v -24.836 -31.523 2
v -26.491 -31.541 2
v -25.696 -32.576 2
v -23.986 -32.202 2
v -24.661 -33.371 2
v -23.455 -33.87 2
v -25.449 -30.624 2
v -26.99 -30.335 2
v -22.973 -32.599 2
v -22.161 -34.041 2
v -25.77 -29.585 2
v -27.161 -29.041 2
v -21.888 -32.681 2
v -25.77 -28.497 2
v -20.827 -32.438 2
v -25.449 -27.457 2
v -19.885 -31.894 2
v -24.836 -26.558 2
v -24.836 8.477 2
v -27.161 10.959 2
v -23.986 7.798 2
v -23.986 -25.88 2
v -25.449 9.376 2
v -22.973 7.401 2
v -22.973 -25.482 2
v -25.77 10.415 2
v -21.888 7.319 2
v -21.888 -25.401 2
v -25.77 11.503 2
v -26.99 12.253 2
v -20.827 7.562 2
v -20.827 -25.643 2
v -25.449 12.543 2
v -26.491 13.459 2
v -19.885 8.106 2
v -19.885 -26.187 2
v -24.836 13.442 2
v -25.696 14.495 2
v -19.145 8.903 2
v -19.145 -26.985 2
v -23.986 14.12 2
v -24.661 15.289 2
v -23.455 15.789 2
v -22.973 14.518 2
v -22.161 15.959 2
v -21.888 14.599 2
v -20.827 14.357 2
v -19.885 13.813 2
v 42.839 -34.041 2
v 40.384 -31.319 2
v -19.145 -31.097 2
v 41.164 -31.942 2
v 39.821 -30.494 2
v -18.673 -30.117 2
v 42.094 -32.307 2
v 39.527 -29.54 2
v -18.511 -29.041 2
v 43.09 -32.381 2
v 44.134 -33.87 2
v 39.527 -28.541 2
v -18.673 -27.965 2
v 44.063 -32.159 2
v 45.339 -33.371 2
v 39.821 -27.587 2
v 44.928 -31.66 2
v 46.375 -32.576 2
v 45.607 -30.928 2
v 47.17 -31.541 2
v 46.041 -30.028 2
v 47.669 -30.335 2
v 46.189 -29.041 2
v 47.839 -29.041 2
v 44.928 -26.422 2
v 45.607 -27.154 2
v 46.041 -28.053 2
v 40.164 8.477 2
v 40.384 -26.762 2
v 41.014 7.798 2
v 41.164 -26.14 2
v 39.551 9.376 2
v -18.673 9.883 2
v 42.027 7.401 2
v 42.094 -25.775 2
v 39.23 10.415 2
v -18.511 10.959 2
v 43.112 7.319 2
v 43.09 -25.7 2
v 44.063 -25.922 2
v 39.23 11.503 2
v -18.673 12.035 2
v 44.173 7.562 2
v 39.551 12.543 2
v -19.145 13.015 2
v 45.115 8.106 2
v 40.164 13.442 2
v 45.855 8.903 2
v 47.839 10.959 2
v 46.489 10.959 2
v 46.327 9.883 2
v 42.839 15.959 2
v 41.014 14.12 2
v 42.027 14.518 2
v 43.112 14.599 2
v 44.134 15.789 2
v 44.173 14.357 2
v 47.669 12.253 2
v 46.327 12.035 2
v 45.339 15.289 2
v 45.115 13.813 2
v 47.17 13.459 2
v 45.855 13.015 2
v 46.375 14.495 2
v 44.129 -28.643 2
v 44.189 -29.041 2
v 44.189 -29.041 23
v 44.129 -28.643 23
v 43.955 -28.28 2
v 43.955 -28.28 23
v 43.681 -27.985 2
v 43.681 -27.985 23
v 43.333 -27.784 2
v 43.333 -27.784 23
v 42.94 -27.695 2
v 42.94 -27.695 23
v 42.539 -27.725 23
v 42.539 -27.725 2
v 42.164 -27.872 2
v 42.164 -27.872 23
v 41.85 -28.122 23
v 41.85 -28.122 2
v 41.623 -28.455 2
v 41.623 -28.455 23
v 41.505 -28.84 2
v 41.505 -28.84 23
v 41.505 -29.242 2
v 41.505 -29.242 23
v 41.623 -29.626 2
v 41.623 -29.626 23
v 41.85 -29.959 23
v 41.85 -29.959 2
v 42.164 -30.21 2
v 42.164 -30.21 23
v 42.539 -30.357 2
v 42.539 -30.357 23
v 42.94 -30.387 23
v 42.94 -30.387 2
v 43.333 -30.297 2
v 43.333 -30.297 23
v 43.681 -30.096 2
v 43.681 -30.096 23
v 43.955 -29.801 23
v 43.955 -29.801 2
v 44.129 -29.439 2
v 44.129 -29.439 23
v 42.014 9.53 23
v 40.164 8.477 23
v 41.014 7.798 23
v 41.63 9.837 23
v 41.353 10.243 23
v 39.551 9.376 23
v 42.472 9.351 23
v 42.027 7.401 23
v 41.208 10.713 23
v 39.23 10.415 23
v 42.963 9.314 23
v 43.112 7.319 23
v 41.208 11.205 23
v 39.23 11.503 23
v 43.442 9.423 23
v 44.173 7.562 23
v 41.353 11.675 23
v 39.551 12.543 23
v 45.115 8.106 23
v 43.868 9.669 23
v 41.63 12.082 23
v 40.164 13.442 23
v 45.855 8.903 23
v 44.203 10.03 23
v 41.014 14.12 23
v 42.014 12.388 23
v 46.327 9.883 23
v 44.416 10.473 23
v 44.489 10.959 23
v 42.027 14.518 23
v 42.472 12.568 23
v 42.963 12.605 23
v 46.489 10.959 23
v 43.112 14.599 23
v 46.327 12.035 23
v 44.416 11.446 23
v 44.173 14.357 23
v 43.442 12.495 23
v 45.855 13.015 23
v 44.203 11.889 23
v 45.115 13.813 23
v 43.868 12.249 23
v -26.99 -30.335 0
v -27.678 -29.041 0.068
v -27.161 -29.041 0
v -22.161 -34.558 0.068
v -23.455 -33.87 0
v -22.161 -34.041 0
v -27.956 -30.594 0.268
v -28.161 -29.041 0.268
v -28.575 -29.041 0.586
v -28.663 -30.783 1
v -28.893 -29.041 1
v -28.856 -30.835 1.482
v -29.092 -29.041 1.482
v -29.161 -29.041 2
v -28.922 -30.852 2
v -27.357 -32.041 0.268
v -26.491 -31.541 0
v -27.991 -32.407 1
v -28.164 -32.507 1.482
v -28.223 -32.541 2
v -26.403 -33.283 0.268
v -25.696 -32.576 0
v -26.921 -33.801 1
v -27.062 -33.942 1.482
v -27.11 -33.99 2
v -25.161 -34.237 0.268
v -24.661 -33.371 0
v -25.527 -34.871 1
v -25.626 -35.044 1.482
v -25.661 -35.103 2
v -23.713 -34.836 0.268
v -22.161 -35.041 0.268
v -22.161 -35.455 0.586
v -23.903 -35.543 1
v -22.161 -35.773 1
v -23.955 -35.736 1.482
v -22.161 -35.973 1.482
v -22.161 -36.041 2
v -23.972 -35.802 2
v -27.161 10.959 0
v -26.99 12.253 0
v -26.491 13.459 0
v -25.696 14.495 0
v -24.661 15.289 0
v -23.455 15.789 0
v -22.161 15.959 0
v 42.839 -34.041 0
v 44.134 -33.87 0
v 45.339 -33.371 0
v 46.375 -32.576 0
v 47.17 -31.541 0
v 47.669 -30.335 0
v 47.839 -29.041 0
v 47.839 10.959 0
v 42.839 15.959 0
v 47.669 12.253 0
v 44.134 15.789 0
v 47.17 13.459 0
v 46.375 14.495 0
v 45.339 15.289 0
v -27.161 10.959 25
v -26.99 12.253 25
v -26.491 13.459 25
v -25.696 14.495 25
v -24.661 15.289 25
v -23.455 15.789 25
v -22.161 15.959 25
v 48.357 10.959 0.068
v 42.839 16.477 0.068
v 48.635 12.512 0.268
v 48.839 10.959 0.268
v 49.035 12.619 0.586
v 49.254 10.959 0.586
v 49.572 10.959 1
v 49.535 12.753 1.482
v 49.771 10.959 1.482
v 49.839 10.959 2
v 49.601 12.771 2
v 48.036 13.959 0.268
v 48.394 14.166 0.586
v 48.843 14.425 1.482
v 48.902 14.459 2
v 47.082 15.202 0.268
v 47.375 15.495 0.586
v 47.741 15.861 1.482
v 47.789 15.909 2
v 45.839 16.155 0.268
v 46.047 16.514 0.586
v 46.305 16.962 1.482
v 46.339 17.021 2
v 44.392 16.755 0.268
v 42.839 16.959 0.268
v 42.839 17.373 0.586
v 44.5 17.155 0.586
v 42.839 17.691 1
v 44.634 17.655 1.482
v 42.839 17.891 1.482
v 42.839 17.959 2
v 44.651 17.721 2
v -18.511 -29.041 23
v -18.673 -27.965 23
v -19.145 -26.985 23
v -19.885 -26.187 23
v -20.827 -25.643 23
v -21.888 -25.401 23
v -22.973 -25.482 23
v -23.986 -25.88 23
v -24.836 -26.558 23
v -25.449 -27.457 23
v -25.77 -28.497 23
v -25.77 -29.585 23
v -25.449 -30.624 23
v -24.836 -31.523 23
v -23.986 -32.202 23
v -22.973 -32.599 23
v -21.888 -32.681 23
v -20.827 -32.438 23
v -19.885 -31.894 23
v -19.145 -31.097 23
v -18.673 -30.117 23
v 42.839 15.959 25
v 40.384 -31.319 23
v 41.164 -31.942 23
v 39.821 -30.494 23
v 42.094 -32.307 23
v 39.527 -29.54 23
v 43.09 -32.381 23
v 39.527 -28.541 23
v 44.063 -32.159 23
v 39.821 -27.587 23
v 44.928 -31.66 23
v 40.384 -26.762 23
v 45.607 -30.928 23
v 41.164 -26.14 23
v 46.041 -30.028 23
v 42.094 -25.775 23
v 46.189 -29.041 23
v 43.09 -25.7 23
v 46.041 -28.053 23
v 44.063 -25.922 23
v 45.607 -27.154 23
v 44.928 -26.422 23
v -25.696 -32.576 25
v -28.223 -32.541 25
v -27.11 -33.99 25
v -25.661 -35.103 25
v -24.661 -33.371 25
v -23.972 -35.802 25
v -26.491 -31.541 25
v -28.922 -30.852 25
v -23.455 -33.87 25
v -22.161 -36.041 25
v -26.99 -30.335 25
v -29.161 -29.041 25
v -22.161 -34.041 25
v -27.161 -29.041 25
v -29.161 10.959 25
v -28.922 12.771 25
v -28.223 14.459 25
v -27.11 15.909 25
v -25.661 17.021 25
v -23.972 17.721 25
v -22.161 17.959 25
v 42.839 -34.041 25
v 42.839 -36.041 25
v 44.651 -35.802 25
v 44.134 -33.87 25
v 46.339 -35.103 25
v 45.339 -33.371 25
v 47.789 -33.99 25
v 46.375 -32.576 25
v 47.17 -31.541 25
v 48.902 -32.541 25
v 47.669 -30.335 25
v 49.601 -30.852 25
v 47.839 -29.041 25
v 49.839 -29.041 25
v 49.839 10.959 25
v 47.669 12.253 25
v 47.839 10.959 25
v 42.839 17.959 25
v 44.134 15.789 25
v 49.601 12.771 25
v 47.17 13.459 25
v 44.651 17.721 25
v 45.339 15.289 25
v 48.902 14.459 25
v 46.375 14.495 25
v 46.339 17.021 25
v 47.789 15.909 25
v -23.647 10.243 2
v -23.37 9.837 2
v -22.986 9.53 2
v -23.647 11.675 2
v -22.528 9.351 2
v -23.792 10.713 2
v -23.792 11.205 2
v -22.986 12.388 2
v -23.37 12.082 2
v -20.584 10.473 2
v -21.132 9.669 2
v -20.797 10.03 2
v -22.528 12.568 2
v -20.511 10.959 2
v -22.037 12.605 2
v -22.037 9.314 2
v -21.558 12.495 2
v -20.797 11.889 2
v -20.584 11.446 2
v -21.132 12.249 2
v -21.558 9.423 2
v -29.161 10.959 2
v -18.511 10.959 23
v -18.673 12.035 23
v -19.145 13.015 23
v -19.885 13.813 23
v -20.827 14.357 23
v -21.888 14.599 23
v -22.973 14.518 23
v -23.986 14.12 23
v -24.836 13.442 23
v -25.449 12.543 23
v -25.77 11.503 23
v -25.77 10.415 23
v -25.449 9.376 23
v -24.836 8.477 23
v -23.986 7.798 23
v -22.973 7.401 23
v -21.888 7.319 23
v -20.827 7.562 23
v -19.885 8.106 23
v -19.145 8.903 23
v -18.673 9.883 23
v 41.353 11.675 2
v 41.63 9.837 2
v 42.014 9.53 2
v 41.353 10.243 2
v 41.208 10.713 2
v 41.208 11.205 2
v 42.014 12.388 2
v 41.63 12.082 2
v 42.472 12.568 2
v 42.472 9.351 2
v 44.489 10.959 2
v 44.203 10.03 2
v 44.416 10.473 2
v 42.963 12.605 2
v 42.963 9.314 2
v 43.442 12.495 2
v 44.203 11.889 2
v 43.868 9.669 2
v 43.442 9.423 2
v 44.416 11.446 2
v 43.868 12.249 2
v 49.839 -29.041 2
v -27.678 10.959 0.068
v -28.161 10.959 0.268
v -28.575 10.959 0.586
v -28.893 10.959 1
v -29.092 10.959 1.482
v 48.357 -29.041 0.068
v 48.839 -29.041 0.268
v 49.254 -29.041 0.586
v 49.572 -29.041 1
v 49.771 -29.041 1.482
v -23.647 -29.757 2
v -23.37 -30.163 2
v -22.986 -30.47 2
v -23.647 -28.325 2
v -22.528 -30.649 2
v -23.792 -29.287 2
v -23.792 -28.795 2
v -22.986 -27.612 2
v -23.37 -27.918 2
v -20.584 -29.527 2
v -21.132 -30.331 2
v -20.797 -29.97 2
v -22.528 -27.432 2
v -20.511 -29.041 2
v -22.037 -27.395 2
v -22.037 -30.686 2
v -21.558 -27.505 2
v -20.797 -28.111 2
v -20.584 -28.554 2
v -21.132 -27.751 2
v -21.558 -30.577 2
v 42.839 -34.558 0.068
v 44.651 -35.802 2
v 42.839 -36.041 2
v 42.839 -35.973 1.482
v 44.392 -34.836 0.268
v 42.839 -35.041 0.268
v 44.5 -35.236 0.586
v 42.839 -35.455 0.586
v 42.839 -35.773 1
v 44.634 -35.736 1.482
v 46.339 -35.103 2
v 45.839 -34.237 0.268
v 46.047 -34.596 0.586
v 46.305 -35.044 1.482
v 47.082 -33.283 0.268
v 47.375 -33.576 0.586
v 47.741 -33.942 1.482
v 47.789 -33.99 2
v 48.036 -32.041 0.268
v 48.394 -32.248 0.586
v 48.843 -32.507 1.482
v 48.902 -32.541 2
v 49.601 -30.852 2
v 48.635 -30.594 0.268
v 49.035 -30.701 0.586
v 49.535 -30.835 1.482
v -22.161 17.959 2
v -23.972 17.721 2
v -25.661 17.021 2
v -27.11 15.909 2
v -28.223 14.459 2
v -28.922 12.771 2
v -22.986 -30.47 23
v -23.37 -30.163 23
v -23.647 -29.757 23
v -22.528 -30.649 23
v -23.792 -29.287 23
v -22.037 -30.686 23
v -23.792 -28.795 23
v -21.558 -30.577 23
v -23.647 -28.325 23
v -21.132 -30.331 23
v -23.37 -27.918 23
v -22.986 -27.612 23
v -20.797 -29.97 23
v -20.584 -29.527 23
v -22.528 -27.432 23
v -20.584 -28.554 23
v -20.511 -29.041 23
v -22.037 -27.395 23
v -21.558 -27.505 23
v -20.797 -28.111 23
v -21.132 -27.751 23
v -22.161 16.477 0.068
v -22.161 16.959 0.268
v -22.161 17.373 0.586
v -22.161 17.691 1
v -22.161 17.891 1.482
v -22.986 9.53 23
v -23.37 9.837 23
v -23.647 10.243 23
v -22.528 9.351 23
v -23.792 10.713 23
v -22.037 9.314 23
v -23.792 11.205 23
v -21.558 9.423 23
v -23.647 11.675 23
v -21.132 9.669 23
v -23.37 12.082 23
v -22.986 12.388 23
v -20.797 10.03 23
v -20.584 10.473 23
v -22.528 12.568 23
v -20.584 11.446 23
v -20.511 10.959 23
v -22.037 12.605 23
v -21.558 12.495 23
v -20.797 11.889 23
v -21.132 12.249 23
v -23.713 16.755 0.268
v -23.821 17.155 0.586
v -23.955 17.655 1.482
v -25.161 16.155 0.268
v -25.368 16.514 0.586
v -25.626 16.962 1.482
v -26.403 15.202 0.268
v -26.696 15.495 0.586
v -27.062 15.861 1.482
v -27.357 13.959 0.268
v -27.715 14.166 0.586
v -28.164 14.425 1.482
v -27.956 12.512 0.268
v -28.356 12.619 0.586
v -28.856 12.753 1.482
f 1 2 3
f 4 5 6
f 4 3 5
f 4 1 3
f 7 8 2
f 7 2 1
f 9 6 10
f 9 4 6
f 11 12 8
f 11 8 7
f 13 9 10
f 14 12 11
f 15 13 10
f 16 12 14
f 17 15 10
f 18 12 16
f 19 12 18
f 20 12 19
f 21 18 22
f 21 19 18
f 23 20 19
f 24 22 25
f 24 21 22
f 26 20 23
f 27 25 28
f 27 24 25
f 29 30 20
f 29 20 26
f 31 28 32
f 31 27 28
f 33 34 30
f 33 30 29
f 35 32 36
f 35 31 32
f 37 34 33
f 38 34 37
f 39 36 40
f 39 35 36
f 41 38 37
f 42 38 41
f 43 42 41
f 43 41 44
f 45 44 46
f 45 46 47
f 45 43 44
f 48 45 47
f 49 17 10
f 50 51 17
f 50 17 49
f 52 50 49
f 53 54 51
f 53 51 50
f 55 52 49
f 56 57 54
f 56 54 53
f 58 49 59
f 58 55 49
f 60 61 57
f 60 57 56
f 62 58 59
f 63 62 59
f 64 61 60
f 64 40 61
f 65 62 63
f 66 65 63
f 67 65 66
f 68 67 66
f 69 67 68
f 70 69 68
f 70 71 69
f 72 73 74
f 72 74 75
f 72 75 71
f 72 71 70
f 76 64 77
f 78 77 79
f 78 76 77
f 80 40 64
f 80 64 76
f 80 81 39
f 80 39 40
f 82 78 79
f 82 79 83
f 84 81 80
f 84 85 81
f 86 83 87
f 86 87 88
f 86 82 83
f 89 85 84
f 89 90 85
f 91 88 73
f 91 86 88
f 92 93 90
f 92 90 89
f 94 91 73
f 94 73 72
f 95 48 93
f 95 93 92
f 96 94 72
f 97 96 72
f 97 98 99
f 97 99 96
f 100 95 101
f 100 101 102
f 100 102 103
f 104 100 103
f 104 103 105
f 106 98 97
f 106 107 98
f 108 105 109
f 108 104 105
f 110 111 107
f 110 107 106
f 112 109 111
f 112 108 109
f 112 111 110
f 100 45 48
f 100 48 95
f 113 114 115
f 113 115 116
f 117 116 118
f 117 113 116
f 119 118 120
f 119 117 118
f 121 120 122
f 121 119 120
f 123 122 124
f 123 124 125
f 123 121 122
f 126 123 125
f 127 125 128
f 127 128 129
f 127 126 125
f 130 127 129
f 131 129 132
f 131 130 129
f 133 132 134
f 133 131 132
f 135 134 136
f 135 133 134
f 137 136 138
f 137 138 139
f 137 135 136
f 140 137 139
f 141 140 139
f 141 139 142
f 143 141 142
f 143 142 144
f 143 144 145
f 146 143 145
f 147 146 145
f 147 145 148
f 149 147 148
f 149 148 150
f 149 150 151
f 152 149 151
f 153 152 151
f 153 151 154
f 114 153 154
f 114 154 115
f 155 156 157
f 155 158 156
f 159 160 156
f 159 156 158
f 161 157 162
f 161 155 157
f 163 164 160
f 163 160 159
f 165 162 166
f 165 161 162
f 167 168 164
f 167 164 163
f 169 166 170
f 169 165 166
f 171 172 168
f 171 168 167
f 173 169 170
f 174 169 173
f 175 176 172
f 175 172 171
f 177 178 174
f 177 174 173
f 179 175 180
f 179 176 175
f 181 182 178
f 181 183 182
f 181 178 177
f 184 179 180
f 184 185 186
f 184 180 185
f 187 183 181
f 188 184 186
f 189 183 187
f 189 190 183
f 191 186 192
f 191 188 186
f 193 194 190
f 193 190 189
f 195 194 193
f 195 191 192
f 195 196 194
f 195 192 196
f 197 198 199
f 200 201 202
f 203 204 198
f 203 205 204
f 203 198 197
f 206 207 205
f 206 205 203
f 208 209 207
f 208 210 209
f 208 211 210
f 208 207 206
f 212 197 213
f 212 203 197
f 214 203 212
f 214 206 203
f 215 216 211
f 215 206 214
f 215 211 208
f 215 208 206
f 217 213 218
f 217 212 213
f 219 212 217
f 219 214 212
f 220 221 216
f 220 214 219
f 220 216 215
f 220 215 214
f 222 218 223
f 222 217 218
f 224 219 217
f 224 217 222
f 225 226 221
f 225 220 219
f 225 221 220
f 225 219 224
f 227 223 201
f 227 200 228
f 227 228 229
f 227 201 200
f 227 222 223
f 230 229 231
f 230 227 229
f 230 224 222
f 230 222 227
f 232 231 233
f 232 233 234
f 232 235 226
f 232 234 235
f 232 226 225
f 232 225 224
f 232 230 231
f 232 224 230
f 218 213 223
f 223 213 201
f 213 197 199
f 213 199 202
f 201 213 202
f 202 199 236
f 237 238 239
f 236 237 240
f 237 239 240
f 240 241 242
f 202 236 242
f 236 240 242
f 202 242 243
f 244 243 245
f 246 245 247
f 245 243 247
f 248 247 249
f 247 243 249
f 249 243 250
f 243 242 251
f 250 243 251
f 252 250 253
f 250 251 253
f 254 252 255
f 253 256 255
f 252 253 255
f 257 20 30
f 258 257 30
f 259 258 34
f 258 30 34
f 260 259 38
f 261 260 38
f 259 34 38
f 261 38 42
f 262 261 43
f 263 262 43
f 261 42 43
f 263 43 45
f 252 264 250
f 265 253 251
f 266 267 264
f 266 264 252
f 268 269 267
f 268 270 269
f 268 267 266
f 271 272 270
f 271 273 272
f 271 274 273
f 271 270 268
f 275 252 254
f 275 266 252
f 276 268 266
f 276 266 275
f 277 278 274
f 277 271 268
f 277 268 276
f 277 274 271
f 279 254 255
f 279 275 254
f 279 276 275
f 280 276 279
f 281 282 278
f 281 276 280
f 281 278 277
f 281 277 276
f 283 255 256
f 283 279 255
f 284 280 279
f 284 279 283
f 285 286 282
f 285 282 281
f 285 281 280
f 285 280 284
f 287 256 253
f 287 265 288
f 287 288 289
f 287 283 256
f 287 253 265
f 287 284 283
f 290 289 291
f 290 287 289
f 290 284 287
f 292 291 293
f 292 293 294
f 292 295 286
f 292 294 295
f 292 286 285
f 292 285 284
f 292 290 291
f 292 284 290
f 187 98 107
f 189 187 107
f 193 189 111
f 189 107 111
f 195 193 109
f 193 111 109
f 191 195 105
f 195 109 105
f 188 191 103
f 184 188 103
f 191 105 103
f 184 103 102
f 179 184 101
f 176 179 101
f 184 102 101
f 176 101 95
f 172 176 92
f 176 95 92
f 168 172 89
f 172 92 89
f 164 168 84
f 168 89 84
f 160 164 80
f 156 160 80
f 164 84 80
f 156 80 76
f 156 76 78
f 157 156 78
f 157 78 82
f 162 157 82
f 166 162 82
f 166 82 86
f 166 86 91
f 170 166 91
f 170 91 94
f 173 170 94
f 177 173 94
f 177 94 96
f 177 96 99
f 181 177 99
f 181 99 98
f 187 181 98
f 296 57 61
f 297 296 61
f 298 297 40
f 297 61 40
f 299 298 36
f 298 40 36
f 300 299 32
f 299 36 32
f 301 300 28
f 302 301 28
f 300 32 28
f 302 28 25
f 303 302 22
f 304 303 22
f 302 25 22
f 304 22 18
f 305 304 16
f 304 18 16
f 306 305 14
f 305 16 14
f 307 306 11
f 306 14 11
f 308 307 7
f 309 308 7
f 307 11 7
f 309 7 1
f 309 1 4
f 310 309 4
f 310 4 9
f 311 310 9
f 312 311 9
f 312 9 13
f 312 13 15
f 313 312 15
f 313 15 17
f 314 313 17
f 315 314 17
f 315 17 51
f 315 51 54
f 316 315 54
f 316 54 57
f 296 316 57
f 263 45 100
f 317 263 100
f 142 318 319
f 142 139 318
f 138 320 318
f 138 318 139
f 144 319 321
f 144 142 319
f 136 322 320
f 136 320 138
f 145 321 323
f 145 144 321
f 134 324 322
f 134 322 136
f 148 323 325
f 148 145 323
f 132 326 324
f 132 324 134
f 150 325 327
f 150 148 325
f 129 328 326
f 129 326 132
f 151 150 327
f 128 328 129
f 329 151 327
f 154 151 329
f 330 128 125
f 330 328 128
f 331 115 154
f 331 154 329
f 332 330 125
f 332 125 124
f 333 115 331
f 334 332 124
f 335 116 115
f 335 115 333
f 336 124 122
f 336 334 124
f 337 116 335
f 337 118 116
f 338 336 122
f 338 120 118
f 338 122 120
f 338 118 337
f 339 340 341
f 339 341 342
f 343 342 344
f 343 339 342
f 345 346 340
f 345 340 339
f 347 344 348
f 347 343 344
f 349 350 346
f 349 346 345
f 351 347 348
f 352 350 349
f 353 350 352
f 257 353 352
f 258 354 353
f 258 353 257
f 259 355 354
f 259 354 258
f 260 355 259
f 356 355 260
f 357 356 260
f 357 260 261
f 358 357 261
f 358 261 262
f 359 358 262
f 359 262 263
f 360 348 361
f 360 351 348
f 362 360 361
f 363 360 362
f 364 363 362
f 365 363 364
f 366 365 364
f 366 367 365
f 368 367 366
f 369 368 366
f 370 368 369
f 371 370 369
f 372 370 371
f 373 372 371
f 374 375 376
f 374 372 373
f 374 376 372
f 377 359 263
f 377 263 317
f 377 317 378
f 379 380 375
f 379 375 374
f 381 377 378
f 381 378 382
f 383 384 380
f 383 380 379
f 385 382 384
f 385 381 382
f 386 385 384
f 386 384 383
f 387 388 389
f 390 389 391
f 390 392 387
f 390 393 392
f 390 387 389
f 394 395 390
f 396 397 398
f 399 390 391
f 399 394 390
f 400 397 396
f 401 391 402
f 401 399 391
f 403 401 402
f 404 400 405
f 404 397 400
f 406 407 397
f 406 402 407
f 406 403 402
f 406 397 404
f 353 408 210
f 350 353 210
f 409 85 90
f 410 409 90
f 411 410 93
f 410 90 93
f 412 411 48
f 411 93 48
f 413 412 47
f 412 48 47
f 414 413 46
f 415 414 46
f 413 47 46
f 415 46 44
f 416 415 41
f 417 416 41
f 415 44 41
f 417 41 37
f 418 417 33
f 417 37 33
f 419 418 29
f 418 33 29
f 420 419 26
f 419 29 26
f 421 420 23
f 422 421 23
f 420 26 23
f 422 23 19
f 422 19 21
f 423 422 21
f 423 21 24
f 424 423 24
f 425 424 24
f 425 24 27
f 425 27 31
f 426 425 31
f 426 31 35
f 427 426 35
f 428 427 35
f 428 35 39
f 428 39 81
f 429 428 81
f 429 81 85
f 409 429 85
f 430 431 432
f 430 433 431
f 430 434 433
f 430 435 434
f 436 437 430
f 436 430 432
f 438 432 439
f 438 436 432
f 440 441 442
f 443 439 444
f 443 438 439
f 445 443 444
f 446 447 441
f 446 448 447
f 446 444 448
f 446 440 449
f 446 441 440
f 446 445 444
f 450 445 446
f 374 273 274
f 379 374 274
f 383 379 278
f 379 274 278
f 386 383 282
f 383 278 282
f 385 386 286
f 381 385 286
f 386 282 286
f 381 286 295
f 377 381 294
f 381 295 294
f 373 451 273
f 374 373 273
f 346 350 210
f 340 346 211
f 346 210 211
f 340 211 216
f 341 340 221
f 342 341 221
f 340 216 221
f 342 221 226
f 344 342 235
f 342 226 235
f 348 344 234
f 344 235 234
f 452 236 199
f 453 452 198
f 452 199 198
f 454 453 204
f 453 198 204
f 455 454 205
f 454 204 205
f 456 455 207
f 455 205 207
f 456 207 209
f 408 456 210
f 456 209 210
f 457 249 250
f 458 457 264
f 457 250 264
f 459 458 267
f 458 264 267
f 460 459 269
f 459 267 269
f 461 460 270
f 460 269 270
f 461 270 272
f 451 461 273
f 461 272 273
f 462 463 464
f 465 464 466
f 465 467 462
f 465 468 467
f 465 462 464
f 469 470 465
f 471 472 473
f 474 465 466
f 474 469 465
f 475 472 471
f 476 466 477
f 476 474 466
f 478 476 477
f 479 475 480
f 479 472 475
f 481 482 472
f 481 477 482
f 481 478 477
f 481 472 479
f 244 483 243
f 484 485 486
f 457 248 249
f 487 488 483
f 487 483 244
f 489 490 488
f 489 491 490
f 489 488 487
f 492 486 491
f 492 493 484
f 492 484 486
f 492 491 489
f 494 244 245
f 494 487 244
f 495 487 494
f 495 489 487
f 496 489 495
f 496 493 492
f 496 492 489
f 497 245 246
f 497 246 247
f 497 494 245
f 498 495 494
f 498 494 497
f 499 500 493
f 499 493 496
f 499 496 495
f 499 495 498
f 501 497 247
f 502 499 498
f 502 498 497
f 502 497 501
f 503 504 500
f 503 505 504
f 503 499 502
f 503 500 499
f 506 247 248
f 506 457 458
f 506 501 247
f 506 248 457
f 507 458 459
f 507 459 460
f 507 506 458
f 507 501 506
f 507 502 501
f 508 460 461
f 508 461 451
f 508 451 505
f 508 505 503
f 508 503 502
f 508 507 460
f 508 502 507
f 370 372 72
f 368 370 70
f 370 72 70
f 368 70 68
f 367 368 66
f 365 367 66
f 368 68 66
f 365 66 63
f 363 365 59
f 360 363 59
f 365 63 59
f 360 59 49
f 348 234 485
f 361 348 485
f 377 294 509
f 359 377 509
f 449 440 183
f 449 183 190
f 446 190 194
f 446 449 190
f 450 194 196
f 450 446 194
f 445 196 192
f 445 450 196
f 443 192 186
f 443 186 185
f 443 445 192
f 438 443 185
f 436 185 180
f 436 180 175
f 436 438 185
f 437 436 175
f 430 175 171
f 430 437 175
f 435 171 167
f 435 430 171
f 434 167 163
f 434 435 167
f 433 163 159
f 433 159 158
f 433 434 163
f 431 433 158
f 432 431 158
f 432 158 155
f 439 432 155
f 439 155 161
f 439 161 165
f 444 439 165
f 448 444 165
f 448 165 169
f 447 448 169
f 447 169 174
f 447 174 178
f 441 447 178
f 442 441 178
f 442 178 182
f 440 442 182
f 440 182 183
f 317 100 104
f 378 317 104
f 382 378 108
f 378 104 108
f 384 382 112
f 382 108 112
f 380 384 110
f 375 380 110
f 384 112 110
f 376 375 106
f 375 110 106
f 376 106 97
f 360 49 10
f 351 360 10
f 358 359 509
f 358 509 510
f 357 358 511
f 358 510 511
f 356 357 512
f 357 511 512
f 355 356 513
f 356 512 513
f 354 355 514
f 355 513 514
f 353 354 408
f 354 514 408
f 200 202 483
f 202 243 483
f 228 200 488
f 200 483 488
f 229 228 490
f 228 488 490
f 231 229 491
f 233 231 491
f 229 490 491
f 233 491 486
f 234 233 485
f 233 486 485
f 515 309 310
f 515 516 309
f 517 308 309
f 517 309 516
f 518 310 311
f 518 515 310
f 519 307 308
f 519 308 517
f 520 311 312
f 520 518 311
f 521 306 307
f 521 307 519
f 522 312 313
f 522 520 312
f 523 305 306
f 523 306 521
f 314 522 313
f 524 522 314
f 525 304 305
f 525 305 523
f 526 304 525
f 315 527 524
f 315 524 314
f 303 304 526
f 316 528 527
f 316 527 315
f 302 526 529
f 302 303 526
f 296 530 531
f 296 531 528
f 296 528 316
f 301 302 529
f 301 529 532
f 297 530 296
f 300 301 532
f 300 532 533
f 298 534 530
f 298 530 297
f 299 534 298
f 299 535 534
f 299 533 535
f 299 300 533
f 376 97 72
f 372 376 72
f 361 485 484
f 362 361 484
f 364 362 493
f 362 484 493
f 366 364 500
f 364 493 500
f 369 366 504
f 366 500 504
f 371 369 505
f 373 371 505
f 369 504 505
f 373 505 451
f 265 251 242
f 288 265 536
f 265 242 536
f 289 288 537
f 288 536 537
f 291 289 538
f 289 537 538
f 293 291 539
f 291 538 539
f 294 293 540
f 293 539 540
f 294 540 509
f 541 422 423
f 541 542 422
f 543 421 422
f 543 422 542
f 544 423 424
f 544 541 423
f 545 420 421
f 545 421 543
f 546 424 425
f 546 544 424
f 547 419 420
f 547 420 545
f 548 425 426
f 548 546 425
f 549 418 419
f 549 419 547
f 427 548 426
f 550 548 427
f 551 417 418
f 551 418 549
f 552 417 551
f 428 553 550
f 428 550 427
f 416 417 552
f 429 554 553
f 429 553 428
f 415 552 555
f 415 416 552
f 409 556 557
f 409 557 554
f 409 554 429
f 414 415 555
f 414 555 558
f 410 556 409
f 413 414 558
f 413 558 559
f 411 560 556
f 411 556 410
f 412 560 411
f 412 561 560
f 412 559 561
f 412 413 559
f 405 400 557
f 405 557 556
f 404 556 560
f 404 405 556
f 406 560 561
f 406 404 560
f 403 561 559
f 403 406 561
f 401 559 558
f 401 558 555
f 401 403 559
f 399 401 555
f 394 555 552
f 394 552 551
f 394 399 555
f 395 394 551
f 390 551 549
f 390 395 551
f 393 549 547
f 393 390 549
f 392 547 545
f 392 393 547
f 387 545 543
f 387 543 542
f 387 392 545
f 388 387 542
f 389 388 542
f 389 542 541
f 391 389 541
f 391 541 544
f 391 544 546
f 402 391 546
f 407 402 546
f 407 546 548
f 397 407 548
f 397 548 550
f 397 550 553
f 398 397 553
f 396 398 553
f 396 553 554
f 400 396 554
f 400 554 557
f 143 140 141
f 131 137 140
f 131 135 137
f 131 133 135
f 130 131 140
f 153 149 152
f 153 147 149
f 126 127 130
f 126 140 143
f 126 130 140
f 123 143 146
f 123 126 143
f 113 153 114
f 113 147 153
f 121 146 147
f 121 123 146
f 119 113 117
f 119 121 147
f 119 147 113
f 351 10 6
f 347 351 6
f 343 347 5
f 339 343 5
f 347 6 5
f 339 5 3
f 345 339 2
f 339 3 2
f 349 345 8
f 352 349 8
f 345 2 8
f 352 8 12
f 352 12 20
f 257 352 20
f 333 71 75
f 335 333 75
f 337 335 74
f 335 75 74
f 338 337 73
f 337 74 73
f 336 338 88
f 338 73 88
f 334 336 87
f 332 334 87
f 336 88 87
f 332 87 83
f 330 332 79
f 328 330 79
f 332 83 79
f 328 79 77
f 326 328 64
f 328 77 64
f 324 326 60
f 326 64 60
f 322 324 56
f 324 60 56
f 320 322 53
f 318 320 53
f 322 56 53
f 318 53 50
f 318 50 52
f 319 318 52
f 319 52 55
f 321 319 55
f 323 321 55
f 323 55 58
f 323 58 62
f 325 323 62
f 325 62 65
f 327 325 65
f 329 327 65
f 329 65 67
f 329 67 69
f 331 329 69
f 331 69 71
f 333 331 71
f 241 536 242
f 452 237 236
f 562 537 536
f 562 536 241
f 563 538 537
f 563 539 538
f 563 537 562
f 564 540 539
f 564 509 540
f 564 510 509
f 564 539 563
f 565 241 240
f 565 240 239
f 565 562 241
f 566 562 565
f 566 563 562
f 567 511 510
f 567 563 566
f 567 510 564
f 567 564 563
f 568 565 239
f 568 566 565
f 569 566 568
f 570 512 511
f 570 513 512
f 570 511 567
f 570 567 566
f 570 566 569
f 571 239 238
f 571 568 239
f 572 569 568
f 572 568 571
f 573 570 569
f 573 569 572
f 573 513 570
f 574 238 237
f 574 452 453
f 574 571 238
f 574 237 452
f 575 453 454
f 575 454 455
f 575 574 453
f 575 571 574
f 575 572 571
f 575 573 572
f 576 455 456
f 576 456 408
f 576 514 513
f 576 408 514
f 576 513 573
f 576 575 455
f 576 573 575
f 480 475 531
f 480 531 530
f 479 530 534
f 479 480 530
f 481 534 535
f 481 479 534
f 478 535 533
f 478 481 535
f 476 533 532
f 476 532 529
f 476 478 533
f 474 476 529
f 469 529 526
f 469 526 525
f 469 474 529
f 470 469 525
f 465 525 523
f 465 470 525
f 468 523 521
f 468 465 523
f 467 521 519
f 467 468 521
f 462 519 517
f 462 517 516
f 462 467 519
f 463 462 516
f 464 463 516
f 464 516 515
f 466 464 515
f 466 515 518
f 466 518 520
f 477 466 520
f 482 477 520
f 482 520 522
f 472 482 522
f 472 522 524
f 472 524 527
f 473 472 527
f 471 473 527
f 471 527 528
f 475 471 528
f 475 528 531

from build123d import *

# Parameters (mm, degrees)
F1_R     = 3.6500000581
F1_R_2   = 3.3500010893
F1_R_3   = 3.649998717
F1_R_4   = 1.65
F1_R_5   = 1.35
F2_DEPTH = 2
F3_DEPTH = 25
F4_DEPTH = 23
F5_R     = 2


with BuildPart() as f2:
    # F1 (on Top) → F2 (new body)
    with BuildSketch(Plane.XY):
        with BuildLine():
            Line((42.8394566104, 17.9592743516), (-22.1605433896, 17.9592743516))
            ThreePointArc((-22.1605433896, 17.9592743516), (-27.1102905971, 15.909021928), (-29.1605430207, 10.9592747205))
            Line((-29.1605430207, 10.9592747205), (-29.1605430207, -29.0407252795))
            ThreePointArc((-29.1605430207, -29.0407252795), (-27.1102905971, -33.9904724869), (-22.1605433896, -36.0407249106))
            Line((-22.1605433896, -36.0407249106), (42.8394566104, -36.0407249106))
            ThreePointArc((42.8394566104, -36.0407249106), (47.7892038178, -33.9904724869), (49.8394562415, -29.0407252795))
            Line((49.8394562415, -29.0407252795), (49.8394562415, 10.9592747205))
            ThreePointArc((49.8394562415, 10.9592747205), (47.7892038178, 15.909021928), (42.8394566104, 17.9592743516))
        make_face()
        with BuildLine():
            ThreePointArc((-27.1605433896, 10.9592747205), (-25.6960772956, 14.4948086265), (-22.1605433896, 15.9592747205))
            Line((-22.1605433896, 15.9592747205), (42.8394566104, 15.9592747205))
            ThreePointArc((42.8394566104, 15.9592747205), (46.3749905163, 14.4948086265), (47.8394566104, 10.9592747205))
            Line((47.8394566104, 10.9592747205), (47.8394566104, -29.0407252795))
            ThreePointArc((47.8394566104, -29.0407252795), (46.3749905163, -32.5762591854), (42.8394566104, -34.0407252795))
            Line((42.8394566104, -34.0407252795), (-22.1605433896, -34.0407252795))
            ThreePointArc((-22.1605433896, -34.0407252795), (-25.6960772956, -32.5762591854), (-27.1605433896, -29.0407252795))
            Line((-27.1605433896, -29.0407252795), (-27.1605433896, 10.9592747205))
        make_face(mode=Mode.SUBTRACT)
        with BuildLine():
            Line((42.8394566104, 15.9592747205), (-22.1605433896, 15.9592747205))
            ThreePointArc((-22.1605433896, 15.9592747205), (-25.6960772956, 14.4948086265), (-27.1605433896, 10.9592747205))
            Line((-27.1605433896, 10.9592747205), (-27.1605433896, -29.0407252795))
            ThreePointArc((-27.1605433896, -29.0407252795), (-25.6960772956, -32.5762591854), (-22.1605433896, -34.0407252795))
            Line((-22.1605433896, -34.0407252795), (42.8394566104, -34.0407252795))
            ThreePointArc((42.8394566104, -34.0407252795), (46.3749905163, -32.5762591854), (47.8394566104, -29.0407252795))
            Line((47.8394566104, -29.0407252795), (47.8394566104, 10.9592747205))
            ThreePointArc((47.8394566104, 10.9592747205), (46.3749905163, 14.4948086265), (42.8394566104, 15.9592747205))
        make_face()
        with Locations((-22.1605433896, -29.0407252795)):
            Circle(F1_R, mode=Mode.SUBTRACT)
        with Locations((42.8394566104, -29.0407252795)):
            Circle(F1_R_2, mode=Mode.SUBTRACT)
        with Locations((-22.1605433896, 10.9592747205)):
            Circle(F1_R, mode=Mode.SUBTRACT)
        with Locations((42.8394566104, 10.9592747205)):
            Circle(F1_R_3, mode=Mode.SUBTRACT)
        with Locations((-22.1605433896, 10.9592747205)):
            Circle(F1_R)
        with Locations((-22.1605433896, 10.9592747205)):
            Circle(F1_R_4, mode=Mode.SUBTRACT)
        with Locations((-22.1605433896, -29.0407252795)):
            Circle(F1_R)
        with Locations((-22.1605433896, -29.0407252795)):
            Circle(F1_R_4, mode=Mode.SUBTRACT)
        with Locations((42.8394566104, 10.9592747205)):
            Circle(F1_R_3)
        with Locations((42.8394566104, 10.9592747205)):
            Circle(F1_R_4, mode=Mode.SUBTRACT)
        with Locations((42.8394566104, -29.0407252795)):
            Circle(F1_R_2)
        with Locations((42.8394566104, -29.0407252795)):
            Circle(F1_R_5, mode=Mode.SUBTRACT)
        with Locations((42.8394566104, 10.9592747205)):
            Circle(F1_R_4)
        with Locations((-22.1605433896, 10.9592747205)):
            Circle(F1_R_4)
        with Locations((-22.1605433896, -29.0407252795)):
            Circle(F1_R_4)
        with Locations((42.8394566104, -29.0407252795)):
            Circle(F1_R_5)
    extrude(amount=F2_DEPTH)

    # F1 (on Top) → F3 (join)
    with BuildSketch(Plane.XY):
        with BuildLine():
            Line((42.8394566104, 17.9592743516), (-22.1605433896, 17.9592743516))
            ThreePointArc((-22.1605433896, 17.9592743516), (-27.1102905971, 15.909021928), (-29.1605430207, 10.9592747205))
            Line((-29.1605430207, 10.9592747205), (-29.1605430207, -29.0407252795))
            ThreePointArc((-29.1605430207, -29.0407252795), (-27.1102905971, -33.9904724869), (-22.1605433896, -36.0407249106))
            Line((-22.1605433896, -36.0407249106), (42.8394566104, -36.0407249106))
            ThreePointArc((42.8394566104, -36.0407249106), (47.7892038178, -33.9904724869), (49.8394562415, -29.0407252795))
            Line((49.8394562415, -29.0407252795), (49.8394562415, 10.9592747205))
            ThreePointArc((49.8394562415, 10.9592747205), (47.7892038178, 15.909021928), (42.8394566104, 17.9592743516))
        make_face()
        with BuildLine():
            ThreePointArc((-27.1605433896, 10.9592747205), (-25.6960772956, 14.4948086265), (-22.1605433896, 15.9592747205))
            Line((-22.1605433896, 15.9592747205), (42.8394566104, 15.9592747205))
            ThreePointArc((42.8394566104, 15.9592747205), (46.3749905163, 14.4948086265), (47.8394566104, 10.9592747205))
            Line((47.8394566104, 10.9592747205), (47.8394566104, -29.0407252795))
            ThreePointArc((47.8394566104, -29.0407252795), (46.3749905163, -32.5762591854), (42.8394566104, -34.0407252795))
            Line((42.8394566104, -34.0407252795), (-22.1605433896, -34.0407252795))
            ThreePointArc((-22.1605433896, -34.0407252795), (-25.6960772956, -32.5762591854), (-27.1605433896, -29.0407252795))
            Line((-27.1605433896, -29.0407252795), (-27.1605433896, 10.9592747205))
        make_face(mode=Mode.SUBTRACT)
    extrude(amount=F3_DEPTH)

    # F1 (on Top) → F4 (join)
    with BuildSketch(Plane.XY):
        with Locations((42.8394566104, 10.9592747205)):
            Circle(F1_R_3)
        with Locations((42.8394566104, 10.9592747205)):
            Circle(F1_R_4, mode=Mode.SUBTRACT)
        with Locations((42.8394566104, -29.0407252795)):
            Circle(F1_R_2)
        with Locations((42.8394566104, -29.0407252795)):
            Circle(F1_R_5, mode=Mode.SUBTRACT)
        with Locations((-22.1605433896, 10.9592747205)):
            Circle(F1_R)
        with Locations((-22.1605433896, 10.9592747205)):
            Circle(F1_R_4, mode=Mode.SUBTRACT)
        with Locations((-22.1605433896, -29.0407252795)):
            Circle(F1_R)
        with Locations((-22.1605433896, -29.0407252795)):
            Circle(F1_R_4, mode=Mode.SUBTRACT)
    extrude(amount=F4_DEPTH)

    # F5
    f5_edges = [f2.edges().sort_by_distance(p)[0] for p in [
        (10.339457, -36.040725, 0),
    ]]
    fillet(f5_edges, radius=F5_R)


solid = f2.part
